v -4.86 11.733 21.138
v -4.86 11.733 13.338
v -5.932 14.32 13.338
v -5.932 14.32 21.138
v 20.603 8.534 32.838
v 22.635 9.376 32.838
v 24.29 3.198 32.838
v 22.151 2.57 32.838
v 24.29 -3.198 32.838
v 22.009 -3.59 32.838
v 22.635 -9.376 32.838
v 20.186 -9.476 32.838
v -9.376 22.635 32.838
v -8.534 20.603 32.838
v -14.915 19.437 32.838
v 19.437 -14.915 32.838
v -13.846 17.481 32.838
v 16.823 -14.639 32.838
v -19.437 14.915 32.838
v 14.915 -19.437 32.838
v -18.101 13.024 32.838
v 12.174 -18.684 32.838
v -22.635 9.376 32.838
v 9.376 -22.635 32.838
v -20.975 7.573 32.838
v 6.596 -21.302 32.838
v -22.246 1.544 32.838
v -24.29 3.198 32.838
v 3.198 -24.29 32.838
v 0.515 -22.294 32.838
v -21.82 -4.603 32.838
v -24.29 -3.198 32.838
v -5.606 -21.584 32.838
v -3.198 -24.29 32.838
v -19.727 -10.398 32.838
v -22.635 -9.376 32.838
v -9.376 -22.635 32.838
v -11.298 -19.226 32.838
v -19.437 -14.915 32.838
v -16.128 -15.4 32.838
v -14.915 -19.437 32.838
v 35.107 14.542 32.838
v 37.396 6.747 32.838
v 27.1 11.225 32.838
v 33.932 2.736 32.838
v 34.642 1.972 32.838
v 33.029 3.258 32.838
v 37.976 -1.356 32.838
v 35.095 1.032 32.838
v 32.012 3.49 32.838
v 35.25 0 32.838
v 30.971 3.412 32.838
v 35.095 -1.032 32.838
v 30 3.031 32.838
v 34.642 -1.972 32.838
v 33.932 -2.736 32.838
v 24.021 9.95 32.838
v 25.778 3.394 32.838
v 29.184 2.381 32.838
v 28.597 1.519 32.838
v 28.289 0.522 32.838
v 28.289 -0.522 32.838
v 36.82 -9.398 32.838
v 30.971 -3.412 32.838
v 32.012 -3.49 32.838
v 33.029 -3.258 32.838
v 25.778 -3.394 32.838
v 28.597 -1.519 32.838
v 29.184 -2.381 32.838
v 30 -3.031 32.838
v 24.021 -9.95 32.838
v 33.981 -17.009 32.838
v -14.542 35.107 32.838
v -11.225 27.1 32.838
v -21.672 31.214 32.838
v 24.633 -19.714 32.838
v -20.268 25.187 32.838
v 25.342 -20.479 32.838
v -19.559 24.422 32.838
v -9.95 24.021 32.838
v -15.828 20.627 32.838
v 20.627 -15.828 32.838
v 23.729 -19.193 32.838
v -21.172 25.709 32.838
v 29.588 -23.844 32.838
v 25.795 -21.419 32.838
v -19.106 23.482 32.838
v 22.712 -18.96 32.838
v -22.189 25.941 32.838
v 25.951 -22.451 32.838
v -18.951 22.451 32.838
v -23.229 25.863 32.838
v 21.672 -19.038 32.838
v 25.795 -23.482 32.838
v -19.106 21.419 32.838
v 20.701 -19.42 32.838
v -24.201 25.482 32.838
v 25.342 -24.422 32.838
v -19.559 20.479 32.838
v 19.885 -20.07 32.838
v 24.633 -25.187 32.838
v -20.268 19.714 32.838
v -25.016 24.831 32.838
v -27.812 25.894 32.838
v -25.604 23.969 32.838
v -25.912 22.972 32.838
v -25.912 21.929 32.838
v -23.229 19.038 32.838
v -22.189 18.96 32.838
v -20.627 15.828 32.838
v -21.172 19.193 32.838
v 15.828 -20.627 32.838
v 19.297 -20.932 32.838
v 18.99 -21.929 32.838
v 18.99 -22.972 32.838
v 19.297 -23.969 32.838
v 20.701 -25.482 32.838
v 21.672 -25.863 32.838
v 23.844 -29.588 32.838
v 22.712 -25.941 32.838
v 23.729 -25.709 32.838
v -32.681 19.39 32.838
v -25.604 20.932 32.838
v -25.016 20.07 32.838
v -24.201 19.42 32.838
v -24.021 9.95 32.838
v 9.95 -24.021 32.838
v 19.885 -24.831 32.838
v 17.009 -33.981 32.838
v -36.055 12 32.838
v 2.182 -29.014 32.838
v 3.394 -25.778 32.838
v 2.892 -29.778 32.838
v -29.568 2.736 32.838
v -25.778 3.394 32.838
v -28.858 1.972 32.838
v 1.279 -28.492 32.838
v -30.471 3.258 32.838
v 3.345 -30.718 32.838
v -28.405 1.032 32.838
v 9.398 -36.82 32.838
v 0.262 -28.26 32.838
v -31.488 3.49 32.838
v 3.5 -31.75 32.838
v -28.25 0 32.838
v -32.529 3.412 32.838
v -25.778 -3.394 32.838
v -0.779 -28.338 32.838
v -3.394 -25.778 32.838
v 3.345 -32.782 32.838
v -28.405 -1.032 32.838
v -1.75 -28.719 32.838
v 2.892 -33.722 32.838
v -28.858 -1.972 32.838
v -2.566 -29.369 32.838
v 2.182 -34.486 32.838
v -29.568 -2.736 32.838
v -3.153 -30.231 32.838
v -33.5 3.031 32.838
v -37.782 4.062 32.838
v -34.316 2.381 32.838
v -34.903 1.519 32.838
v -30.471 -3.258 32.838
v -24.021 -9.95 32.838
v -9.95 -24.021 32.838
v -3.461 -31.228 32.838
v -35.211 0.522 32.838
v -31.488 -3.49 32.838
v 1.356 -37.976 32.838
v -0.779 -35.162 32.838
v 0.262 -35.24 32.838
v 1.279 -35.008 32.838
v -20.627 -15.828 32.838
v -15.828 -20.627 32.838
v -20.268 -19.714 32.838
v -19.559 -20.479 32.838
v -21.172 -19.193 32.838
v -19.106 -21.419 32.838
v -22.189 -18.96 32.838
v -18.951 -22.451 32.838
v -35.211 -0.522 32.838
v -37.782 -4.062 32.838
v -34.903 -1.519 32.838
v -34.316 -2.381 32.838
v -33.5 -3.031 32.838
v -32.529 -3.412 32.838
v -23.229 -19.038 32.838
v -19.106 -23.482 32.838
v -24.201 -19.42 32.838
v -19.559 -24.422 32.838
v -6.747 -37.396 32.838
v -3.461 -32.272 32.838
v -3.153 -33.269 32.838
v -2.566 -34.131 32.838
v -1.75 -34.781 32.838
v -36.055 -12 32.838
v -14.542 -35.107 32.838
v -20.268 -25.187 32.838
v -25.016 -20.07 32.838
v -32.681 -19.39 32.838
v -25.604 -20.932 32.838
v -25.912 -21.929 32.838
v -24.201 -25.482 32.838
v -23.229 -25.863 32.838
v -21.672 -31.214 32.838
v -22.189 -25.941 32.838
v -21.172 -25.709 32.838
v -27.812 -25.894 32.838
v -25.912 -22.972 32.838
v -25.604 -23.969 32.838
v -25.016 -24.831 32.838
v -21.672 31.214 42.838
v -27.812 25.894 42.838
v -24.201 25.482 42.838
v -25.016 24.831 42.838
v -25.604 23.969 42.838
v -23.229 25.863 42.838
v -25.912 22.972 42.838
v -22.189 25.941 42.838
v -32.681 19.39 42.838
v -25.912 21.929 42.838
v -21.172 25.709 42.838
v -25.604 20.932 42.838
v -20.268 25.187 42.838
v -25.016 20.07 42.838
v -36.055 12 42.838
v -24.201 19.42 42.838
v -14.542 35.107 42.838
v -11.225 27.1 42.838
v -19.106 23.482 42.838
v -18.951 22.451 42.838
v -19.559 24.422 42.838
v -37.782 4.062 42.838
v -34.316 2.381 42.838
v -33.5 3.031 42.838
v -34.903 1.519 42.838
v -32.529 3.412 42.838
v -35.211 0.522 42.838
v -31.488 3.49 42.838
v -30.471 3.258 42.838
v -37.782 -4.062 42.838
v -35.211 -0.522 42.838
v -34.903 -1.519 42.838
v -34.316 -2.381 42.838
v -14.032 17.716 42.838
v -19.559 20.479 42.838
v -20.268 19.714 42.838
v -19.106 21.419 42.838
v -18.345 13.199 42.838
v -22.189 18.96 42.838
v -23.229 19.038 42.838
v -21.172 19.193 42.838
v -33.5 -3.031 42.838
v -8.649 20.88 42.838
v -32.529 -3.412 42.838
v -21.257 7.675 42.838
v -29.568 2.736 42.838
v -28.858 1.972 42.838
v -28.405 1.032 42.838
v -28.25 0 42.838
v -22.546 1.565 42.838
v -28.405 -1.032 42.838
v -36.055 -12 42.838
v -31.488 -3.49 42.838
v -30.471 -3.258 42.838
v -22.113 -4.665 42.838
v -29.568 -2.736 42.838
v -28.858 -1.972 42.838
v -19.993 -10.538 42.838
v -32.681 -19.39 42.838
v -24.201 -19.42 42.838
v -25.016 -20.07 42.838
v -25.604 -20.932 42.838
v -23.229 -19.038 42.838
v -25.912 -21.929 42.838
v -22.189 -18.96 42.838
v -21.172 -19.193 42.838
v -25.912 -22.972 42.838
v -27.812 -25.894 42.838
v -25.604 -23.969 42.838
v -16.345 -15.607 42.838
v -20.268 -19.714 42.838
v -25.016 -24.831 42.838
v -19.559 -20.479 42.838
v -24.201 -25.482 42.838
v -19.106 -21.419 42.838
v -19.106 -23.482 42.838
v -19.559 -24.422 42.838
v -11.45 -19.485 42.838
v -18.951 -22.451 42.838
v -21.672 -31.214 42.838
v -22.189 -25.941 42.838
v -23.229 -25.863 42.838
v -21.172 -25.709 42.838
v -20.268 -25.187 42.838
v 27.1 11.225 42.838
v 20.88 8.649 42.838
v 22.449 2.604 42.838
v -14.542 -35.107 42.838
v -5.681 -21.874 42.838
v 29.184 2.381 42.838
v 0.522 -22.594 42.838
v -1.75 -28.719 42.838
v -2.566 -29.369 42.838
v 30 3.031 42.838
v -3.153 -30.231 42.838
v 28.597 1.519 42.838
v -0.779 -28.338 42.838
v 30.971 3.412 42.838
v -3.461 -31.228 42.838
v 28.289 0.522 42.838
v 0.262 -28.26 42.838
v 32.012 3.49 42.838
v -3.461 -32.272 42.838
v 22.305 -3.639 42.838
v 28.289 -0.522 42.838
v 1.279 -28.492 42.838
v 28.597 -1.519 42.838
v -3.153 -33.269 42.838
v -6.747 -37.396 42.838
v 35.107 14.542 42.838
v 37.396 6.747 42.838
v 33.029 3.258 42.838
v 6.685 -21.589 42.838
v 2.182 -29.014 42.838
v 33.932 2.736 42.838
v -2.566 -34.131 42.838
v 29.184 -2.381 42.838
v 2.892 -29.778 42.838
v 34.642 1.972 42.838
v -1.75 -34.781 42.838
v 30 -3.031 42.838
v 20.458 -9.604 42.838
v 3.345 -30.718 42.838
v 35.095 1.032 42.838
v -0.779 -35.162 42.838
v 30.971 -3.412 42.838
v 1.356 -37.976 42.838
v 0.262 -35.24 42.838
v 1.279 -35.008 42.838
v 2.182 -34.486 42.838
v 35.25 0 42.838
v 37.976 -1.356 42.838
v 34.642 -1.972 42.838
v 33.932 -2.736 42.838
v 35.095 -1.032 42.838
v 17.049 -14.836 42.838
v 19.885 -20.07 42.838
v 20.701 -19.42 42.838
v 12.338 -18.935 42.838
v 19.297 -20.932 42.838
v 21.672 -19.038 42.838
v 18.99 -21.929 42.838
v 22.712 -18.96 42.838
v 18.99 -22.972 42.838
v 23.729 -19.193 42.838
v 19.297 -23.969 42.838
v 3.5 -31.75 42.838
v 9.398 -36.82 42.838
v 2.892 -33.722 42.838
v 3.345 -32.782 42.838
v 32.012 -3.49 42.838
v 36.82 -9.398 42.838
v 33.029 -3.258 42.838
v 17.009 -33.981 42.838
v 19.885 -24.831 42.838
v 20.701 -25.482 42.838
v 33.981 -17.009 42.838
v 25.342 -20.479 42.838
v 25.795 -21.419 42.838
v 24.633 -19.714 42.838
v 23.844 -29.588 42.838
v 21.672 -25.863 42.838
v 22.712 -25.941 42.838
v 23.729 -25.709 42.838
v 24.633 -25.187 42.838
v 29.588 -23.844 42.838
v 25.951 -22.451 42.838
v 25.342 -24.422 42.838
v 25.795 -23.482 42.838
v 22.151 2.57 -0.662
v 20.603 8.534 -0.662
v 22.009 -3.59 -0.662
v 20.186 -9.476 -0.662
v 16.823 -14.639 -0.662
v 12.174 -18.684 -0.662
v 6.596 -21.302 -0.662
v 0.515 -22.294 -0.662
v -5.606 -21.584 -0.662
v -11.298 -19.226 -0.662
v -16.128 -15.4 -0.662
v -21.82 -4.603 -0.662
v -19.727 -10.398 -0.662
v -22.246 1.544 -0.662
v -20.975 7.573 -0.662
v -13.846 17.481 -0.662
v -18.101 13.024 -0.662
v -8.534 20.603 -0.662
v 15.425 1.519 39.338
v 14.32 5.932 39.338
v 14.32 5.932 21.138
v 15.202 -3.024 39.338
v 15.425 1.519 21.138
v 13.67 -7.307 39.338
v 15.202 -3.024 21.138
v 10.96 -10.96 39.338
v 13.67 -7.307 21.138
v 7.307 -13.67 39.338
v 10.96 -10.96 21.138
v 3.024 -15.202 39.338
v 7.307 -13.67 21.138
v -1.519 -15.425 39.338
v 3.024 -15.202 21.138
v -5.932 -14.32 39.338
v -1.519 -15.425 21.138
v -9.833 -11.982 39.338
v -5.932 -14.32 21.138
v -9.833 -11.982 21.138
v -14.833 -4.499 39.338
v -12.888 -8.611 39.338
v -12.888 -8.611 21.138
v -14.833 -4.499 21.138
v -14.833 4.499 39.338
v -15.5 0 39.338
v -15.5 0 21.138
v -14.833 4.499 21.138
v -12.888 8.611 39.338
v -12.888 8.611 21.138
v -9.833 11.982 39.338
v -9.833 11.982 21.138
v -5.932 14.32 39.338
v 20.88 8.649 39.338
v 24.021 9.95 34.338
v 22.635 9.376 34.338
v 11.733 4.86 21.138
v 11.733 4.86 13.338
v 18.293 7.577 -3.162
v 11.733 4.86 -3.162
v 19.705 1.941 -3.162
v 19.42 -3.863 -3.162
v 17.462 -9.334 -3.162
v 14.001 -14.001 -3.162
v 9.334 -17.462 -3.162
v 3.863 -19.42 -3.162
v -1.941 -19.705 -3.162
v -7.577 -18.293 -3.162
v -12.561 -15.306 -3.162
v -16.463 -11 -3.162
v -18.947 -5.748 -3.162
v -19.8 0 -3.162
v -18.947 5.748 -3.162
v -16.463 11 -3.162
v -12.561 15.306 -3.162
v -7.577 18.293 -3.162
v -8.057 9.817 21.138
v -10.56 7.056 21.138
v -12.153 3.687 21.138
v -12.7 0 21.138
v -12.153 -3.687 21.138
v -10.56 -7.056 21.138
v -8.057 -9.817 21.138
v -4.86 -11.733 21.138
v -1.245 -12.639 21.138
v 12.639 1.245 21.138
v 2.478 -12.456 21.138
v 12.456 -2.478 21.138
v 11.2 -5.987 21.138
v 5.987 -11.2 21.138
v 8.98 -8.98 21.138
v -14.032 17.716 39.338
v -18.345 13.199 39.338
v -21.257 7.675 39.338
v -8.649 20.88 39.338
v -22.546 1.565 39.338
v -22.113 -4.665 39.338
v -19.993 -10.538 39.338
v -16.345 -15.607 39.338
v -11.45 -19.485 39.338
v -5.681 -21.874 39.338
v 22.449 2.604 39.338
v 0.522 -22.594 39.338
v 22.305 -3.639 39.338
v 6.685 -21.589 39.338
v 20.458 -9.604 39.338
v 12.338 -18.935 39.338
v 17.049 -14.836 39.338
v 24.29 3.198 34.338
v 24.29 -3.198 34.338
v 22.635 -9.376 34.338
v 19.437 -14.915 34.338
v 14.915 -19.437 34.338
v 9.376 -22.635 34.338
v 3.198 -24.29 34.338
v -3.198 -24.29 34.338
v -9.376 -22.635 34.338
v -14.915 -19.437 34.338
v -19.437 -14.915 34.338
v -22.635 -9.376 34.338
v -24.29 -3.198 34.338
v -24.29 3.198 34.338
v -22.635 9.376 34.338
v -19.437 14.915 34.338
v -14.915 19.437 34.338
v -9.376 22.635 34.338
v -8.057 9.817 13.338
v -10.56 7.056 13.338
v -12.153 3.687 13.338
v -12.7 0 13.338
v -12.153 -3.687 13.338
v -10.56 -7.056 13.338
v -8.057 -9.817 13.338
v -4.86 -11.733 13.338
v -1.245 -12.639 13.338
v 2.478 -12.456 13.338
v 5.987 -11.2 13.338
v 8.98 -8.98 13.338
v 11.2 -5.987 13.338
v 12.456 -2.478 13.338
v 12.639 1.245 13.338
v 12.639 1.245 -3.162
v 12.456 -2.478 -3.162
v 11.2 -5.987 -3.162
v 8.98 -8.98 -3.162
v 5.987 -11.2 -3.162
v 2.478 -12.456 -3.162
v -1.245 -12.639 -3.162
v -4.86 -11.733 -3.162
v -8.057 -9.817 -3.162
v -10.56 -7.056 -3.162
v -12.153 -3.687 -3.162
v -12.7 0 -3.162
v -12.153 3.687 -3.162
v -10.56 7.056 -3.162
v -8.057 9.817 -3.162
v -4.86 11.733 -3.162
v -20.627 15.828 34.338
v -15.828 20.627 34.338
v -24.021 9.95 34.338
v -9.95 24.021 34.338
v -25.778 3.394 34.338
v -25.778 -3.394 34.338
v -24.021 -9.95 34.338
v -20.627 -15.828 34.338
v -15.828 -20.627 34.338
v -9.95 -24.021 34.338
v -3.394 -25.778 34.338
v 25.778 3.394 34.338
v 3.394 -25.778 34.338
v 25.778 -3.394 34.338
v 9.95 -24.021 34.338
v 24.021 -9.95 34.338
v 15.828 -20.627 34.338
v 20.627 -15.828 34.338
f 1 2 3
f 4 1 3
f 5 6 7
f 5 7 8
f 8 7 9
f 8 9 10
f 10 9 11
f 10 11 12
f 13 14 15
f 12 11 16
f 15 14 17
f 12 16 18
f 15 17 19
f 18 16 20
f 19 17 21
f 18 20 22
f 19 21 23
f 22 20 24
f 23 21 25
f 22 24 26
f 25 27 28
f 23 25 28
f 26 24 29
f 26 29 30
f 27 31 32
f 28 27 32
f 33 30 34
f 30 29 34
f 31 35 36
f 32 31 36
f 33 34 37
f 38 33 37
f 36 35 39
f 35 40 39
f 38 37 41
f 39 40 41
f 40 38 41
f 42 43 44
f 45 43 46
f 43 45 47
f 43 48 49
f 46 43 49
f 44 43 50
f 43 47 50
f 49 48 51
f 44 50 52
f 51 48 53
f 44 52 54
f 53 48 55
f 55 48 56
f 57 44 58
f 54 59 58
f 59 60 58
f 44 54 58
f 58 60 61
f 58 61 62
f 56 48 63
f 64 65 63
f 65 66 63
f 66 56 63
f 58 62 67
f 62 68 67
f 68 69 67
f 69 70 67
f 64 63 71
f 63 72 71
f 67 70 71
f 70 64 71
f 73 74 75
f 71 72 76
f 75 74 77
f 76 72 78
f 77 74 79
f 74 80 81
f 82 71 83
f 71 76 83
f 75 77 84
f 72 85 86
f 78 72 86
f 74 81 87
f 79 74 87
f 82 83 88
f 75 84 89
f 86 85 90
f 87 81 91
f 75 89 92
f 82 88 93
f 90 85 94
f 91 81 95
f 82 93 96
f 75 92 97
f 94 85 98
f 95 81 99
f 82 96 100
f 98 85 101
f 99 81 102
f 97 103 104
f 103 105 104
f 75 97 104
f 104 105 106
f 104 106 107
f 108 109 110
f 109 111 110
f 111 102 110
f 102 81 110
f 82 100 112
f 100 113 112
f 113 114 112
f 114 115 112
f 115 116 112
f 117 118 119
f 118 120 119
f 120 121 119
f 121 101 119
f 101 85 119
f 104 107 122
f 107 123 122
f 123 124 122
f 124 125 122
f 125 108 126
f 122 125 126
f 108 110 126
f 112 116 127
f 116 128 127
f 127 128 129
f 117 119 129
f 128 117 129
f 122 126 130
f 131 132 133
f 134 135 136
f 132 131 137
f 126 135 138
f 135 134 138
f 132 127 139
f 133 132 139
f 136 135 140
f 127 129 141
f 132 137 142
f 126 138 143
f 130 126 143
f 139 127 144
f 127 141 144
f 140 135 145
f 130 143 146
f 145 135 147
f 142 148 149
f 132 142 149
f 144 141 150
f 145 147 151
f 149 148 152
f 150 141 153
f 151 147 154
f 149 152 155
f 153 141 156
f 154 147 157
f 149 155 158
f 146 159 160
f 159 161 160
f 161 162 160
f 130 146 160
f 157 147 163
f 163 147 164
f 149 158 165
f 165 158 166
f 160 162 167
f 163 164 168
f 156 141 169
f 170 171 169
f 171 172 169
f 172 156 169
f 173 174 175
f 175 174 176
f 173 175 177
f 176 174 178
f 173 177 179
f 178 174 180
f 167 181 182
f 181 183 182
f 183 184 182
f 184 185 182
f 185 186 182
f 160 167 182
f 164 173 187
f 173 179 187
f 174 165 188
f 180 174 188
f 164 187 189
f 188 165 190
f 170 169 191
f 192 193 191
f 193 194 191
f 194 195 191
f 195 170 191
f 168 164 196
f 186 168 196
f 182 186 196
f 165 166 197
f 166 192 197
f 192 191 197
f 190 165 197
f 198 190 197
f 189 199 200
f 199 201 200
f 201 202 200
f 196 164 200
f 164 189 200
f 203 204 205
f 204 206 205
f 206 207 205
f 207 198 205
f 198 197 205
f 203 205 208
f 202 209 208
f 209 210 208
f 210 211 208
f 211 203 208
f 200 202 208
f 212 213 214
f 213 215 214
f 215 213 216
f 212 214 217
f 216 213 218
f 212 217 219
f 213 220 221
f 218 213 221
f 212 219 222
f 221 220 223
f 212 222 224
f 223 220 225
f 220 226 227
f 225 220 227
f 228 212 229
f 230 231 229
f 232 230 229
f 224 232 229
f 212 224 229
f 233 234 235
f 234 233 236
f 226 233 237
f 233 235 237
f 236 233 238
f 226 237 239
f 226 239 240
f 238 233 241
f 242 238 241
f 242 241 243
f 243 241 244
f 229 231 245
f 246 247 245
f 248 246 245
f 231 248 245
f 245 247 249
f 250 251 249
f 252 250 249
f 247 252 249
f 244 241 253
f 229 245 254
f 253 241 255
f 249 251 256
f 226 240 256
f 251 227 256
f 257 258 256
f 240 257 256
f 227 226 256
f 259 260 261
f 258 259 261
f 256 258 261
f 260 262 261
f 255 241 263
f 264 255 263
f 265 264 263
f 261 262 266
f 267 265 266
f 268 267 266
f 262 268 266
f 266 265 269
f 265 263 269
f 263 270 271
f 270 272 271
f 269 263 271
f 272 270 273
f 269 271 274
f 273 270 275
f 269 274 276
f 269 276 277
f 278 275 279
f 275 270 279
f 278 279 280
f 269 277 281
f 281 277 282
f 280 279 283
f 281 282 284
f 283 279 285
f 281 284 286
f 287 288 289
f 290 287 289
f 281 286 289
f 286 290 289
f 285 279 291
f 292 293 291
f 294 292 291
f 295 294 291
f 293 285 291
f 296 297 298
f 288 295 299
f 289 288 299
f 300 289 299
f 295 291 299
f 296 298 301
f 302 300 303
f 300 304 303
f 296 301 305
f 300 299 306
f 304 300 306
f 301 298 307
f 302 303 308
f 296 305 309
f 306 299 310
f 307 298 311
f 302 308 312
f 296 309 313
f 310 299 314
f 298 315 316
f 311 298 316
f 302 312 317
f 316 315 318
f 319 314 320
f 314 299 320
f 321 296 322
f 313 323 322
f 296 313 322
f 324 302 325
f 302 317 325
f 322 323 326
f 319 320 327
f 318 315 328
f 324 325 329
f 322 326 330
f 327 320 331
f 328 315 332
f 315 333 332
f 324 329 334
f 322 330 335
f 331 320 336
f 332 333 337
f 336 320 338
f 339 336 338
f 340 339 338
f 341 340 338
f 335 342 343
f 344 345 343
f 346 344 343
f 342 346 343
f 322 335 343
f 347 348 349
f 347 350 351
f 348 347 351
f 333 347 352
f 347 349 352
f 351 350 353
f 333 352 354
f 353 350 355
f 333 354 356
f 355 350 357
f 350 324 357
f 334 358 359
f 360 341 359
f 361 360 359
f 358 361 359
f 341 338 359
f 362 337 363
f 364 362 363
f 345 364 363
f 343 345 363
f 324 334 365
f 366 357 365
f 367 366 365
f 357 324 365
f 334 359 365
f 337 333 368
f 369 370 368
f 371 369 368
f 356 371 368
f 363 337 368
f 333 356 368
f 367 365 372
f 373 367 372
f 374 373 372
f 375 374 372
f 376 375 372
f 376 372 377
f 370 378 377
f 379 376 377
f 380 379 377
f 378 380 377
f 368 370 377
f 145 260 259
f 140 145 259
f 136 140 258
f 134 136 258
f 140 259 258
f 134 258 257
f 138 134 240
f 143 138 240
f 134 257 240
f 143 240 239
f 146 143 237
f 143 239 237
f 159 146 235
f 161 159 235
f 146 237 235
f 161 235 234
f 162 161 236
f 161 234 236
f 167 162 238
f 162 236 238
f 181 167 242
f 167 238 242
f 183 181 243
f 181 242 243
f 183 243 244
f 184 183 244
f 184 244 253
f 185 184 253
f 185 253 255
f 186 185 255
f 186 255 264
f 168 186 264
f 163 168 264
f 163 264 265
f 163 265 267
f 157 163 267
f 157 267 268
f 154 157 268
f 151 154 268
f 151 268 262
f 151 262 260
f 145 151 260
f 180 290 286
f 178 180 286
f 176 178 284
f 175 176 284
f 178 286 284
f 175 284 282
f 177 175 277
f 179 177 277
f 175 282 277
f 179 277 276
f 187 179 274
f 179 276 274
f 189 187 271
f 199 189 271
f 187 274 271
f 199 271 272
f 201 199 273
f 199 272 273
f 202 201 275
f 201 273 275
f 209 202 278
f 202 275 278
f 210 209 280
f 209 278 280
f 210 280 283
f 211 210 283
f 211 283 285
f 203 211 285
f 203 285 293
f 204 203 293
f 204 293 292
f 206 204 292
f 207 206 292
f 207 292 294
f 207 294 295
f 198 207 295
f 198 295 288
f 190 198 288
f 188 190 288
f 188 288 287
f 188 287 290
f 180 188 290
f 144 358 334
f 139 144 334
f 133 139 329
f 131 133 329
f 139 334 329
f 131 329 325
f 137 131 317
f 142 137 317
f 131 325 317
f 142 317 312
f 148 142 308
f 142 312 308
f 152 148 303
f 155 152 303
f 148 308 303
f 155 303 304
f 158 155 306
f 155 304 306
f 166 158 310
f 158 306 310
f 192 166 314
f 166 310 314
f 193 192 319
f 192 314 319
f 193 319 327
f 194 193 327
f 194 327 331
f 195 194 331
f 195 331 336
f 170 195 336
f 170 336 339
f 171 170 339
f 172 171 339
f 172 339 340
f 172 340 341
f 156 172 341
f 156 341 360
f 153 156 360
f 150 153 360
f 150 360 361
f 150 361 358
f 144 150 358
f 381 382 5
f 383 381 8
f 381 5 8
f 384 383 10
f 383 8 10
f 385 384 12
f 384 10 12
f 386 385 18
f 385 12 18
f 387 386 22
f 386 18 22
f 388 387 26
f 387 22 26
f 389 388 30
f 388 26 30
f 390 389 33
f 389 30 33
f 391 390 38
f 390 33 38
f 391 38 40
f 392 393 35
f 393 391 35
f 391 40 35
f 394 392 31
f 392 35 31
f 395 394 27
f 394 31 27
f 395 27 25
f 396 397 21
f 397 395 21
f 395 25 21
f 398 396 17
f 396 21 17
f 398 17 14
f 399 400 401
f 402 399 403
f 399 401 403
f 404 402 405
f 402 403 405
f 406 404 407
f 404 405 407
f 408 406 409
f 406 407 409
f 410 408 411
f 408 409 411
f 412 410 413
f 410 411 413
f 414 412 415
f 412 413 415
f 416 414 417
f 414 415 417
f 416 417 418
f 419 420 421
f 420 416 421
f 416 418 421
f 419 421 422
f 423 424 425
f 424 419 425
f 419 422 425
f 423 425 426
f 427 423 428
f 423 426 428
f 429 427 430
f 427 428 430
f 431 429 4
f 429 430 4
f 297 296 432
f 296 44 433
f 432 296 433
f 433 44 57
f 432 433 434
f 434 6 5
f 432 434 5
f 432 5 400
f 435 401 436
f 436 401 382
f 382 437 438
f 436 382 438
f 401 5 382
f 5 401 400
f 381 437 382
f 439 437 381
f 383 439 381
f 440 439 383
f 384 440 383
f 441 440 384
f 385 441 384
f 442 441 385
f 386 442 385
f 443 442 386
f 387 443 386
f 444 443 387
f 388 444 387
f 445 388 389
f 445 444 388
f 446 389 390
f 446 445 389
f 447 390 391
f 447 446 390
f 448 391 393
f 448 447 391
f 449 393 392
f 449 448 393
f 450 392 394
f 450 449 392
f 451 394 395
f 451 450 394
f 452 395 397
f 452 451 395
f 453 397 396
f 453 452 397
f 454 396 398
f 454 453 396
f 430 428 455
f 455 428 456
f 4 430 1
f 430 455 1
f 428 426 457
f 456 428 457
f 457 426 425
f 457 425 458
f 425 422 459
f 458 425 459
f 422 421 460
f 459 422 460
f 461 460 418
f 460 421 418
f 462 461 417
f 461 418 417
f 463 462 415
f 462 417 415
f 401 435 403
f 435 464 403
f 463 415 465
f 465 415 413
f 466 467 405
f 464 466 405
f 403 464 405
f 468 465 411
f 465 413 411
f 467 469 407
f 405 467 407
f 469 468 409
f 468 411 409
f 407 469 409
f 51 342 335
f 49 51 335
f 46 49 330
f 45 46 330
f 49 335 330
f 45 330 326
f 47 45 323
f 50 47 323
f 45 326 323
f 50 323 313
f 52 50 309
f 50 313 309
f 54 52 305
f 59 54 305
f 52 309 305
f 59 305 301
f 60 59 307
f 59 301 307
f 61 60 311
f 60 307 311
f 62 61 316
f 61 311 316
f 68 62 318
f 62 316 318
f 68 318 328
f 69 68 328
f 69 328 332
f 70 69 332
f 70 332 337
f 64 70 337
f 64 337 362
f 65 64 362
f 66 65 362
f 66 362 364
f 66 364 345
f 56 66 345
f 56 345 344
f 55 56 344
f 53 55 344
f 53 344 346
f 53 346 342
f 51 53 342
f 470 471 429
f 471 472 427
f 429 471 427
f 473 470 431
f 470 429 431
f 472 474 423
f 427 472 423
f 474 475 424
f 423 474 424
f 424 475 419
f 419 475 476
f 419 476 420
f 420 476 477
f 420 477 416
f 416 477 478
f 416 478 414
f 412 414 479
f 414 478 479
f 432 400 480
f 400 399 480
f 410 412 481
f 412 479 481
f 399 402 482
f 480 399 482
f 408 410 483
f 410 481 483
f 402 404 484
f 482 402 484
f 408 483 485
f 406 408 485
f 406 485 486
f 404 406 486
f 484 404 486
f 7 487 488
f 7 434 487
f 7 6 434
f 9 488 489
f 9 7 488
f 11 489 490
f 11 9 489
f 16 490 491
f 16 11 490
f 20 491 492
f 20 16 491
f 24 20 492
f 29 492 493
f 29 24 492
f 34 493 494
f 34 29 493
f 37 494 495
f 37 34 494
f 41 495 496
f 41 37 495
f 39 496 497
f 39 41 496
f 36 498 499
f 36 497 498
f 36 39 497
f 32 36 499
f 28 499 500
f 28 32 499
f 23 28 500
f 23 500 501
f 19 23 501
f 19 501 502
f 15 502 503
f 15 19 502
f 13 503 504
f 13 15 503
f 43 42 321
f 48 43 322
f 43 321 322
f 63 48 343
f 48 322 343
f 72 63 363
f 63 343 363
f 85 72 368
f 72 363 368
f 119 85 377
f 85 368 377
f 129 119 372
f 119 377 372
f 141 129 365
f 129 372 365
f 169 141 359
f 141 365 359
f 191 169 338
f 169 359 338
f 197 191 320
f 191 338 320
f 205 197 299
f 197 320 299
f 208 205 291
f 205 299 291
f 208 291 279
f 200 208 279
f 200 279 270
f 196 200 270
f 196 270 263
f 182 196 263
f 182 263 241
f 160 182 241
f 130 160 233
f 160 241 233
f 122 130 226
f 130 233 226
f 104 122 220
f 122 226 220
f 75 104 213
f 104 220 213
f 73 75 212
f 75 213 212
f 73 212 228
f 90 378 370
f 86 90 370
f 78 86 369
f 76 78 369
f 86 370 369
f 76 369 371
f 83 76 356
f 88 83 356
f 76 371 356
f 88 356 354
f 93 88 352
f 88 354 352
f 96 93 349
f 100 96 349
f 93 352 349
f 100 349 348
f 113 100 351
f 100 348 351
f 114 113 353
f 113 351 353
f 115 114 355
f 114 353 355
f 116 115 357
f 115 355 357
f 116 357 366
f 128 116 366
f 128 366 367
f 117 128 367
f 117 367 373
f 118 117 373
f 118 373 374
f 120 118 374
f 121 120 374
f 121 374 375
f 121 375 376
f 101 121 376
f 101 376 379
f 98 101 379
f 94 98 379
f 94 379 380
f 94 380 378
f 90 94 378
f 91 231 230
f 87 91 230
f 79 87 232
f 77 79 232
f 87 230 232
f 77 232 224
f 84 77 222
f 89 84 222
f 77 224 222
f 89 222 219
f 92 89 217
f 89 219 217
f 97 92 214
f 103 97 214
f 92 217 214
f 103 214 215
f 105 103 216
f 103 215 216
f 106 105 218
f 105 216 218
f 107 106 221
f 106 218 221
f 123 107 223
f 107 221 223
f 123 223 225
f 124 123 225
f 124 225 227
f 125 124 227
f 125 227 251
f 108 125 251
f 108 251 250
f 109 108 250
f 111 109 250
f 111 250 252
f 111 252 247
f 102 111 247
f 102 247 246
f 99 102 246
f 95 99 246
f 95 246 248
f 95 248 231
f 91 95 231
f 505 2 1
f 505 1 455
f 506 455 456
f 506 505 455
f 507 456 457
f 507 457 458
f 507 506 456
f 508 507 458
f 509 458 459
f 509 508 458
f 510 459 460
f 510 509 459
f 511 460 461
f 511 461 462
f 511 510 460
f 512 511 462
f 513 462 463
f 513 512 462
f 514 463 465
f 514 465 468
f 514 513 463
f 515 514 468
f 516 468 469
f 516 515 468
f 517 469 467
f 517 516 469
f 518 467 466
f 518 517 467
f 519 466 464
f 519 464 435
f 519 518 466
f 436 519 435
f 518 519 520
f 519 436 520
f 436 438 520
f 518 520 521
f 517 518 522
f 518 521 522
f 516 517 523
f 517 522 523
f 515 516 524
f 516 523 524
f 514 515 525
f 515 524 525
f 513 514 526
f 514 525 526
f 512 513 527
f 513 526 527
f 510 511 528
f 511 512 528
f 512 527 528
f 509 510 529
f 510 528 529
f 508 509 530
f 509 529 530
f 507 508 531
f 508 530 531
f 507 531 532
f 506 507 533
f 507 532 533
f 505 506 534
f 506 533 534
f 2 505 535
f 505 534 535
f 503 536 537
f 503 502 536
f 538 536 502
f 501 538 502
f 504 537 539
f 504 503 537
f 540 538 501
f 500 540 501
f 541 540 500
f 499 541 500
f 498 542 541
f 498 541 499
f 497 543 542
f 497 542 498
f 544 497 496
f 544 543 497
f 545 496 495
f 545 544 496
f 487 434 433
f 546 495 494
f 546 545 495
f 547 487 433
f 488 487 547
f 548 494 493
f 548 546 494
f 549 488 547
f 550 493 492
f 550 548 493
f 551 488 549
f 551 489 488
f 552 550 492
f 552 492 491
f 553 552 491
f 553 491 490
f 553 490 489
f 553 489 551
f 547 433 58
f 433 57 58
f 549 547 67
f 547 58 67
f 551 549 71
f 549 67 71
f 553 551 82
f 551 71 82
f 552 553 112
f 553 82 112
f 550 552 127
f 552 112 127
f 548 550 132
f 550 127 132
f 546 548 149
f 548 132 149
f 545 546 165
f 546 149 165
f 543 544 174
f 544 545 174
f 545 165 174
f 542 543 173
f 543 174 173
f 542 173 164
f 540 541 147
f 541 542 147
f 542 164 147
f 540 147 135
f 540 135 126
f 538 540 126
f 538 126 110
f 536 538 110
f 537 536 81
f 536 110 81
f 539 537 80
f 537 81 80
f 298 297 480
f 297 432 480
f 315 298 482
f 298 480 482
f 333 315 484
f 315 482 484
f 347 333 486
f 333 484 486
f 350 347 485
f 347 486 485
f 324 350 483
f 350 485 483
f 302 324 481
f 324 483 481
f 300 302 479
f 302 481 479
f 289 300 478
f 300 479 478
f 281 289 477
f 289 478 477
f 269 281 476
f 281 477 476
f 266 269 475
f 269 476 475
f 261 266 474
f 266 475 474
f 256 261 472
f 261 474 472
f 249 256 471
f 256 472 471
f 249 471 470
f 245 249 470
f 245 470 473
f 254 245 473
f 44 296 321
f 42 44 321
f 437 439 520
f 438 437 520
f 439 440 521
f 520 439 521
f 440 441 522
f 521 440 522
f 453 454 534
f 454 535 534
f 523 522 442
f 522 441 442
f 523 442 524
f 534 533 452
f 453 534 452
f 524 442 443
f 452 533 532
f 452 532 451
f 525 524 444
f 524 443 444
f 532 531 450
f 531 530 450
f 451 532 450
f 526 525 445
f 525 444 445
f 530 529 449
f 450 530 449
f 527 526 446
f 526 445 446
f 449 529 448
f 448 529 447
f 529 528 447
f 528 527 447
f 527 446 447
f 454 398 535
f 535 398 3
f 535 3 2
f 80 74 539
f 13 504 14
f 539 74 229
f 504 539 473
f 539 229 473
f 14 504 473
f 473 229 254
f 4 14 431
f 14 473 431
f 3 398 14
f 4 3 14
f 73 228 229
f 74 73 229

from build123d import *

# Parameters (mm, degrees)
F2_R     = 3.5
F3_DEPTH = 25
F4_SIZE  = 2.5
F5_R     = 26
F5_R_2   = 24.5
F6_DEPTH = 1.5
F8_DEPTH = 46.001
F9_DEPTH = 7.8


with BuildPart() as f1:
    # F0 (on Front) → F1 (revolve)
    with BuildSketch(Plane.XZ):
        Polygon((38, 42.8381226957), (22.6, 42.8381226957), (22.6, 39.3381226957), (15.5, 39.3381226957), (15.5, 13.3381226957), (12.7, 13.3381226957), (12.7, -3.1618773043), (18.4, -3.1618773043), (22.3, -3.1618773043), (22.3, 32.8381226957), (38, 32.8381226957), align=None)
    revolve(axis=Axis((0, 0, -18.1553717703), (0, 0, -1)))

    # F2 (on face) → F3 (cut)
    with BuildSketch(Plane.XY.offset(42.8381226957)):
        with Locations((0, 31.75)):
            Circle(F2_R)
        with Locations((0, -31.75)):
            Circle(F2_R)
        with Locations((31.75, 0)):
            Circle(F2_R)
        with Locations((-31.75, 0)):
            Circle(F2_R)
        with Locations((-22.4506403027, 22.4506403027)):
            Circle(F2_R)
        with Locations((22.4506403027, 22.4506403027)):
            Circle(F2_R)
        with Locations((22.4506403027, -22.4506403027)):
            Circle(F2_R)
        with Locations((-22.4506403027, -22.4506403027)):
            Circle(F2_R)
    extrude(amount=-F3_DEPTH, mode=Mode.SUBTRACT)

    # F4
    f4_edges = [f1.edges().sort_by_distance(p)[0] for p in [
        (-22.3, 0, -3.161877),
    ]]
    chamfer(f4_edges, length=F4_SIZE)

    # F5 (on face) → F6 (cut)
    with BuildSketch(Plane(origin=(0, 0, 32.8381226957), x_dir=(1, 0, 0), z_dir=(0, 0, -1))):
        Circle(F5_R)
        Circle(F5_R_2, mode=Mode.SUBTRACT)
    extrude(amount=-F6_DEPTH, mode=Mode.SUBTRACT)

    # F7 (on face) → F8 (cut, through all)
    with BuildSketch(Plane.XY.offset(42.8381226957)):
        Polygon((-17.75567684, 42.8659958362), (-11.2253201513, 27.1003201513), (0, 0), (27.1003201513, 11.2253201513), (39.6317325238, 16.4160011117), (25.7364641875, 40.4654443264), align=None)
    extrude(amount=-F8_DEPTH, mode=Mode.SUBTRACT)

    # F9 (add): a face of the model
    f9_faces = [f1.faces().sort_by_distance(p)[0] for p in [
        (-5.7669841433, -13.9227313326, 13.3381226957),
    ]]
    extrude(f9_faces, amount=F9_DEPTH)


solid = f1.part
